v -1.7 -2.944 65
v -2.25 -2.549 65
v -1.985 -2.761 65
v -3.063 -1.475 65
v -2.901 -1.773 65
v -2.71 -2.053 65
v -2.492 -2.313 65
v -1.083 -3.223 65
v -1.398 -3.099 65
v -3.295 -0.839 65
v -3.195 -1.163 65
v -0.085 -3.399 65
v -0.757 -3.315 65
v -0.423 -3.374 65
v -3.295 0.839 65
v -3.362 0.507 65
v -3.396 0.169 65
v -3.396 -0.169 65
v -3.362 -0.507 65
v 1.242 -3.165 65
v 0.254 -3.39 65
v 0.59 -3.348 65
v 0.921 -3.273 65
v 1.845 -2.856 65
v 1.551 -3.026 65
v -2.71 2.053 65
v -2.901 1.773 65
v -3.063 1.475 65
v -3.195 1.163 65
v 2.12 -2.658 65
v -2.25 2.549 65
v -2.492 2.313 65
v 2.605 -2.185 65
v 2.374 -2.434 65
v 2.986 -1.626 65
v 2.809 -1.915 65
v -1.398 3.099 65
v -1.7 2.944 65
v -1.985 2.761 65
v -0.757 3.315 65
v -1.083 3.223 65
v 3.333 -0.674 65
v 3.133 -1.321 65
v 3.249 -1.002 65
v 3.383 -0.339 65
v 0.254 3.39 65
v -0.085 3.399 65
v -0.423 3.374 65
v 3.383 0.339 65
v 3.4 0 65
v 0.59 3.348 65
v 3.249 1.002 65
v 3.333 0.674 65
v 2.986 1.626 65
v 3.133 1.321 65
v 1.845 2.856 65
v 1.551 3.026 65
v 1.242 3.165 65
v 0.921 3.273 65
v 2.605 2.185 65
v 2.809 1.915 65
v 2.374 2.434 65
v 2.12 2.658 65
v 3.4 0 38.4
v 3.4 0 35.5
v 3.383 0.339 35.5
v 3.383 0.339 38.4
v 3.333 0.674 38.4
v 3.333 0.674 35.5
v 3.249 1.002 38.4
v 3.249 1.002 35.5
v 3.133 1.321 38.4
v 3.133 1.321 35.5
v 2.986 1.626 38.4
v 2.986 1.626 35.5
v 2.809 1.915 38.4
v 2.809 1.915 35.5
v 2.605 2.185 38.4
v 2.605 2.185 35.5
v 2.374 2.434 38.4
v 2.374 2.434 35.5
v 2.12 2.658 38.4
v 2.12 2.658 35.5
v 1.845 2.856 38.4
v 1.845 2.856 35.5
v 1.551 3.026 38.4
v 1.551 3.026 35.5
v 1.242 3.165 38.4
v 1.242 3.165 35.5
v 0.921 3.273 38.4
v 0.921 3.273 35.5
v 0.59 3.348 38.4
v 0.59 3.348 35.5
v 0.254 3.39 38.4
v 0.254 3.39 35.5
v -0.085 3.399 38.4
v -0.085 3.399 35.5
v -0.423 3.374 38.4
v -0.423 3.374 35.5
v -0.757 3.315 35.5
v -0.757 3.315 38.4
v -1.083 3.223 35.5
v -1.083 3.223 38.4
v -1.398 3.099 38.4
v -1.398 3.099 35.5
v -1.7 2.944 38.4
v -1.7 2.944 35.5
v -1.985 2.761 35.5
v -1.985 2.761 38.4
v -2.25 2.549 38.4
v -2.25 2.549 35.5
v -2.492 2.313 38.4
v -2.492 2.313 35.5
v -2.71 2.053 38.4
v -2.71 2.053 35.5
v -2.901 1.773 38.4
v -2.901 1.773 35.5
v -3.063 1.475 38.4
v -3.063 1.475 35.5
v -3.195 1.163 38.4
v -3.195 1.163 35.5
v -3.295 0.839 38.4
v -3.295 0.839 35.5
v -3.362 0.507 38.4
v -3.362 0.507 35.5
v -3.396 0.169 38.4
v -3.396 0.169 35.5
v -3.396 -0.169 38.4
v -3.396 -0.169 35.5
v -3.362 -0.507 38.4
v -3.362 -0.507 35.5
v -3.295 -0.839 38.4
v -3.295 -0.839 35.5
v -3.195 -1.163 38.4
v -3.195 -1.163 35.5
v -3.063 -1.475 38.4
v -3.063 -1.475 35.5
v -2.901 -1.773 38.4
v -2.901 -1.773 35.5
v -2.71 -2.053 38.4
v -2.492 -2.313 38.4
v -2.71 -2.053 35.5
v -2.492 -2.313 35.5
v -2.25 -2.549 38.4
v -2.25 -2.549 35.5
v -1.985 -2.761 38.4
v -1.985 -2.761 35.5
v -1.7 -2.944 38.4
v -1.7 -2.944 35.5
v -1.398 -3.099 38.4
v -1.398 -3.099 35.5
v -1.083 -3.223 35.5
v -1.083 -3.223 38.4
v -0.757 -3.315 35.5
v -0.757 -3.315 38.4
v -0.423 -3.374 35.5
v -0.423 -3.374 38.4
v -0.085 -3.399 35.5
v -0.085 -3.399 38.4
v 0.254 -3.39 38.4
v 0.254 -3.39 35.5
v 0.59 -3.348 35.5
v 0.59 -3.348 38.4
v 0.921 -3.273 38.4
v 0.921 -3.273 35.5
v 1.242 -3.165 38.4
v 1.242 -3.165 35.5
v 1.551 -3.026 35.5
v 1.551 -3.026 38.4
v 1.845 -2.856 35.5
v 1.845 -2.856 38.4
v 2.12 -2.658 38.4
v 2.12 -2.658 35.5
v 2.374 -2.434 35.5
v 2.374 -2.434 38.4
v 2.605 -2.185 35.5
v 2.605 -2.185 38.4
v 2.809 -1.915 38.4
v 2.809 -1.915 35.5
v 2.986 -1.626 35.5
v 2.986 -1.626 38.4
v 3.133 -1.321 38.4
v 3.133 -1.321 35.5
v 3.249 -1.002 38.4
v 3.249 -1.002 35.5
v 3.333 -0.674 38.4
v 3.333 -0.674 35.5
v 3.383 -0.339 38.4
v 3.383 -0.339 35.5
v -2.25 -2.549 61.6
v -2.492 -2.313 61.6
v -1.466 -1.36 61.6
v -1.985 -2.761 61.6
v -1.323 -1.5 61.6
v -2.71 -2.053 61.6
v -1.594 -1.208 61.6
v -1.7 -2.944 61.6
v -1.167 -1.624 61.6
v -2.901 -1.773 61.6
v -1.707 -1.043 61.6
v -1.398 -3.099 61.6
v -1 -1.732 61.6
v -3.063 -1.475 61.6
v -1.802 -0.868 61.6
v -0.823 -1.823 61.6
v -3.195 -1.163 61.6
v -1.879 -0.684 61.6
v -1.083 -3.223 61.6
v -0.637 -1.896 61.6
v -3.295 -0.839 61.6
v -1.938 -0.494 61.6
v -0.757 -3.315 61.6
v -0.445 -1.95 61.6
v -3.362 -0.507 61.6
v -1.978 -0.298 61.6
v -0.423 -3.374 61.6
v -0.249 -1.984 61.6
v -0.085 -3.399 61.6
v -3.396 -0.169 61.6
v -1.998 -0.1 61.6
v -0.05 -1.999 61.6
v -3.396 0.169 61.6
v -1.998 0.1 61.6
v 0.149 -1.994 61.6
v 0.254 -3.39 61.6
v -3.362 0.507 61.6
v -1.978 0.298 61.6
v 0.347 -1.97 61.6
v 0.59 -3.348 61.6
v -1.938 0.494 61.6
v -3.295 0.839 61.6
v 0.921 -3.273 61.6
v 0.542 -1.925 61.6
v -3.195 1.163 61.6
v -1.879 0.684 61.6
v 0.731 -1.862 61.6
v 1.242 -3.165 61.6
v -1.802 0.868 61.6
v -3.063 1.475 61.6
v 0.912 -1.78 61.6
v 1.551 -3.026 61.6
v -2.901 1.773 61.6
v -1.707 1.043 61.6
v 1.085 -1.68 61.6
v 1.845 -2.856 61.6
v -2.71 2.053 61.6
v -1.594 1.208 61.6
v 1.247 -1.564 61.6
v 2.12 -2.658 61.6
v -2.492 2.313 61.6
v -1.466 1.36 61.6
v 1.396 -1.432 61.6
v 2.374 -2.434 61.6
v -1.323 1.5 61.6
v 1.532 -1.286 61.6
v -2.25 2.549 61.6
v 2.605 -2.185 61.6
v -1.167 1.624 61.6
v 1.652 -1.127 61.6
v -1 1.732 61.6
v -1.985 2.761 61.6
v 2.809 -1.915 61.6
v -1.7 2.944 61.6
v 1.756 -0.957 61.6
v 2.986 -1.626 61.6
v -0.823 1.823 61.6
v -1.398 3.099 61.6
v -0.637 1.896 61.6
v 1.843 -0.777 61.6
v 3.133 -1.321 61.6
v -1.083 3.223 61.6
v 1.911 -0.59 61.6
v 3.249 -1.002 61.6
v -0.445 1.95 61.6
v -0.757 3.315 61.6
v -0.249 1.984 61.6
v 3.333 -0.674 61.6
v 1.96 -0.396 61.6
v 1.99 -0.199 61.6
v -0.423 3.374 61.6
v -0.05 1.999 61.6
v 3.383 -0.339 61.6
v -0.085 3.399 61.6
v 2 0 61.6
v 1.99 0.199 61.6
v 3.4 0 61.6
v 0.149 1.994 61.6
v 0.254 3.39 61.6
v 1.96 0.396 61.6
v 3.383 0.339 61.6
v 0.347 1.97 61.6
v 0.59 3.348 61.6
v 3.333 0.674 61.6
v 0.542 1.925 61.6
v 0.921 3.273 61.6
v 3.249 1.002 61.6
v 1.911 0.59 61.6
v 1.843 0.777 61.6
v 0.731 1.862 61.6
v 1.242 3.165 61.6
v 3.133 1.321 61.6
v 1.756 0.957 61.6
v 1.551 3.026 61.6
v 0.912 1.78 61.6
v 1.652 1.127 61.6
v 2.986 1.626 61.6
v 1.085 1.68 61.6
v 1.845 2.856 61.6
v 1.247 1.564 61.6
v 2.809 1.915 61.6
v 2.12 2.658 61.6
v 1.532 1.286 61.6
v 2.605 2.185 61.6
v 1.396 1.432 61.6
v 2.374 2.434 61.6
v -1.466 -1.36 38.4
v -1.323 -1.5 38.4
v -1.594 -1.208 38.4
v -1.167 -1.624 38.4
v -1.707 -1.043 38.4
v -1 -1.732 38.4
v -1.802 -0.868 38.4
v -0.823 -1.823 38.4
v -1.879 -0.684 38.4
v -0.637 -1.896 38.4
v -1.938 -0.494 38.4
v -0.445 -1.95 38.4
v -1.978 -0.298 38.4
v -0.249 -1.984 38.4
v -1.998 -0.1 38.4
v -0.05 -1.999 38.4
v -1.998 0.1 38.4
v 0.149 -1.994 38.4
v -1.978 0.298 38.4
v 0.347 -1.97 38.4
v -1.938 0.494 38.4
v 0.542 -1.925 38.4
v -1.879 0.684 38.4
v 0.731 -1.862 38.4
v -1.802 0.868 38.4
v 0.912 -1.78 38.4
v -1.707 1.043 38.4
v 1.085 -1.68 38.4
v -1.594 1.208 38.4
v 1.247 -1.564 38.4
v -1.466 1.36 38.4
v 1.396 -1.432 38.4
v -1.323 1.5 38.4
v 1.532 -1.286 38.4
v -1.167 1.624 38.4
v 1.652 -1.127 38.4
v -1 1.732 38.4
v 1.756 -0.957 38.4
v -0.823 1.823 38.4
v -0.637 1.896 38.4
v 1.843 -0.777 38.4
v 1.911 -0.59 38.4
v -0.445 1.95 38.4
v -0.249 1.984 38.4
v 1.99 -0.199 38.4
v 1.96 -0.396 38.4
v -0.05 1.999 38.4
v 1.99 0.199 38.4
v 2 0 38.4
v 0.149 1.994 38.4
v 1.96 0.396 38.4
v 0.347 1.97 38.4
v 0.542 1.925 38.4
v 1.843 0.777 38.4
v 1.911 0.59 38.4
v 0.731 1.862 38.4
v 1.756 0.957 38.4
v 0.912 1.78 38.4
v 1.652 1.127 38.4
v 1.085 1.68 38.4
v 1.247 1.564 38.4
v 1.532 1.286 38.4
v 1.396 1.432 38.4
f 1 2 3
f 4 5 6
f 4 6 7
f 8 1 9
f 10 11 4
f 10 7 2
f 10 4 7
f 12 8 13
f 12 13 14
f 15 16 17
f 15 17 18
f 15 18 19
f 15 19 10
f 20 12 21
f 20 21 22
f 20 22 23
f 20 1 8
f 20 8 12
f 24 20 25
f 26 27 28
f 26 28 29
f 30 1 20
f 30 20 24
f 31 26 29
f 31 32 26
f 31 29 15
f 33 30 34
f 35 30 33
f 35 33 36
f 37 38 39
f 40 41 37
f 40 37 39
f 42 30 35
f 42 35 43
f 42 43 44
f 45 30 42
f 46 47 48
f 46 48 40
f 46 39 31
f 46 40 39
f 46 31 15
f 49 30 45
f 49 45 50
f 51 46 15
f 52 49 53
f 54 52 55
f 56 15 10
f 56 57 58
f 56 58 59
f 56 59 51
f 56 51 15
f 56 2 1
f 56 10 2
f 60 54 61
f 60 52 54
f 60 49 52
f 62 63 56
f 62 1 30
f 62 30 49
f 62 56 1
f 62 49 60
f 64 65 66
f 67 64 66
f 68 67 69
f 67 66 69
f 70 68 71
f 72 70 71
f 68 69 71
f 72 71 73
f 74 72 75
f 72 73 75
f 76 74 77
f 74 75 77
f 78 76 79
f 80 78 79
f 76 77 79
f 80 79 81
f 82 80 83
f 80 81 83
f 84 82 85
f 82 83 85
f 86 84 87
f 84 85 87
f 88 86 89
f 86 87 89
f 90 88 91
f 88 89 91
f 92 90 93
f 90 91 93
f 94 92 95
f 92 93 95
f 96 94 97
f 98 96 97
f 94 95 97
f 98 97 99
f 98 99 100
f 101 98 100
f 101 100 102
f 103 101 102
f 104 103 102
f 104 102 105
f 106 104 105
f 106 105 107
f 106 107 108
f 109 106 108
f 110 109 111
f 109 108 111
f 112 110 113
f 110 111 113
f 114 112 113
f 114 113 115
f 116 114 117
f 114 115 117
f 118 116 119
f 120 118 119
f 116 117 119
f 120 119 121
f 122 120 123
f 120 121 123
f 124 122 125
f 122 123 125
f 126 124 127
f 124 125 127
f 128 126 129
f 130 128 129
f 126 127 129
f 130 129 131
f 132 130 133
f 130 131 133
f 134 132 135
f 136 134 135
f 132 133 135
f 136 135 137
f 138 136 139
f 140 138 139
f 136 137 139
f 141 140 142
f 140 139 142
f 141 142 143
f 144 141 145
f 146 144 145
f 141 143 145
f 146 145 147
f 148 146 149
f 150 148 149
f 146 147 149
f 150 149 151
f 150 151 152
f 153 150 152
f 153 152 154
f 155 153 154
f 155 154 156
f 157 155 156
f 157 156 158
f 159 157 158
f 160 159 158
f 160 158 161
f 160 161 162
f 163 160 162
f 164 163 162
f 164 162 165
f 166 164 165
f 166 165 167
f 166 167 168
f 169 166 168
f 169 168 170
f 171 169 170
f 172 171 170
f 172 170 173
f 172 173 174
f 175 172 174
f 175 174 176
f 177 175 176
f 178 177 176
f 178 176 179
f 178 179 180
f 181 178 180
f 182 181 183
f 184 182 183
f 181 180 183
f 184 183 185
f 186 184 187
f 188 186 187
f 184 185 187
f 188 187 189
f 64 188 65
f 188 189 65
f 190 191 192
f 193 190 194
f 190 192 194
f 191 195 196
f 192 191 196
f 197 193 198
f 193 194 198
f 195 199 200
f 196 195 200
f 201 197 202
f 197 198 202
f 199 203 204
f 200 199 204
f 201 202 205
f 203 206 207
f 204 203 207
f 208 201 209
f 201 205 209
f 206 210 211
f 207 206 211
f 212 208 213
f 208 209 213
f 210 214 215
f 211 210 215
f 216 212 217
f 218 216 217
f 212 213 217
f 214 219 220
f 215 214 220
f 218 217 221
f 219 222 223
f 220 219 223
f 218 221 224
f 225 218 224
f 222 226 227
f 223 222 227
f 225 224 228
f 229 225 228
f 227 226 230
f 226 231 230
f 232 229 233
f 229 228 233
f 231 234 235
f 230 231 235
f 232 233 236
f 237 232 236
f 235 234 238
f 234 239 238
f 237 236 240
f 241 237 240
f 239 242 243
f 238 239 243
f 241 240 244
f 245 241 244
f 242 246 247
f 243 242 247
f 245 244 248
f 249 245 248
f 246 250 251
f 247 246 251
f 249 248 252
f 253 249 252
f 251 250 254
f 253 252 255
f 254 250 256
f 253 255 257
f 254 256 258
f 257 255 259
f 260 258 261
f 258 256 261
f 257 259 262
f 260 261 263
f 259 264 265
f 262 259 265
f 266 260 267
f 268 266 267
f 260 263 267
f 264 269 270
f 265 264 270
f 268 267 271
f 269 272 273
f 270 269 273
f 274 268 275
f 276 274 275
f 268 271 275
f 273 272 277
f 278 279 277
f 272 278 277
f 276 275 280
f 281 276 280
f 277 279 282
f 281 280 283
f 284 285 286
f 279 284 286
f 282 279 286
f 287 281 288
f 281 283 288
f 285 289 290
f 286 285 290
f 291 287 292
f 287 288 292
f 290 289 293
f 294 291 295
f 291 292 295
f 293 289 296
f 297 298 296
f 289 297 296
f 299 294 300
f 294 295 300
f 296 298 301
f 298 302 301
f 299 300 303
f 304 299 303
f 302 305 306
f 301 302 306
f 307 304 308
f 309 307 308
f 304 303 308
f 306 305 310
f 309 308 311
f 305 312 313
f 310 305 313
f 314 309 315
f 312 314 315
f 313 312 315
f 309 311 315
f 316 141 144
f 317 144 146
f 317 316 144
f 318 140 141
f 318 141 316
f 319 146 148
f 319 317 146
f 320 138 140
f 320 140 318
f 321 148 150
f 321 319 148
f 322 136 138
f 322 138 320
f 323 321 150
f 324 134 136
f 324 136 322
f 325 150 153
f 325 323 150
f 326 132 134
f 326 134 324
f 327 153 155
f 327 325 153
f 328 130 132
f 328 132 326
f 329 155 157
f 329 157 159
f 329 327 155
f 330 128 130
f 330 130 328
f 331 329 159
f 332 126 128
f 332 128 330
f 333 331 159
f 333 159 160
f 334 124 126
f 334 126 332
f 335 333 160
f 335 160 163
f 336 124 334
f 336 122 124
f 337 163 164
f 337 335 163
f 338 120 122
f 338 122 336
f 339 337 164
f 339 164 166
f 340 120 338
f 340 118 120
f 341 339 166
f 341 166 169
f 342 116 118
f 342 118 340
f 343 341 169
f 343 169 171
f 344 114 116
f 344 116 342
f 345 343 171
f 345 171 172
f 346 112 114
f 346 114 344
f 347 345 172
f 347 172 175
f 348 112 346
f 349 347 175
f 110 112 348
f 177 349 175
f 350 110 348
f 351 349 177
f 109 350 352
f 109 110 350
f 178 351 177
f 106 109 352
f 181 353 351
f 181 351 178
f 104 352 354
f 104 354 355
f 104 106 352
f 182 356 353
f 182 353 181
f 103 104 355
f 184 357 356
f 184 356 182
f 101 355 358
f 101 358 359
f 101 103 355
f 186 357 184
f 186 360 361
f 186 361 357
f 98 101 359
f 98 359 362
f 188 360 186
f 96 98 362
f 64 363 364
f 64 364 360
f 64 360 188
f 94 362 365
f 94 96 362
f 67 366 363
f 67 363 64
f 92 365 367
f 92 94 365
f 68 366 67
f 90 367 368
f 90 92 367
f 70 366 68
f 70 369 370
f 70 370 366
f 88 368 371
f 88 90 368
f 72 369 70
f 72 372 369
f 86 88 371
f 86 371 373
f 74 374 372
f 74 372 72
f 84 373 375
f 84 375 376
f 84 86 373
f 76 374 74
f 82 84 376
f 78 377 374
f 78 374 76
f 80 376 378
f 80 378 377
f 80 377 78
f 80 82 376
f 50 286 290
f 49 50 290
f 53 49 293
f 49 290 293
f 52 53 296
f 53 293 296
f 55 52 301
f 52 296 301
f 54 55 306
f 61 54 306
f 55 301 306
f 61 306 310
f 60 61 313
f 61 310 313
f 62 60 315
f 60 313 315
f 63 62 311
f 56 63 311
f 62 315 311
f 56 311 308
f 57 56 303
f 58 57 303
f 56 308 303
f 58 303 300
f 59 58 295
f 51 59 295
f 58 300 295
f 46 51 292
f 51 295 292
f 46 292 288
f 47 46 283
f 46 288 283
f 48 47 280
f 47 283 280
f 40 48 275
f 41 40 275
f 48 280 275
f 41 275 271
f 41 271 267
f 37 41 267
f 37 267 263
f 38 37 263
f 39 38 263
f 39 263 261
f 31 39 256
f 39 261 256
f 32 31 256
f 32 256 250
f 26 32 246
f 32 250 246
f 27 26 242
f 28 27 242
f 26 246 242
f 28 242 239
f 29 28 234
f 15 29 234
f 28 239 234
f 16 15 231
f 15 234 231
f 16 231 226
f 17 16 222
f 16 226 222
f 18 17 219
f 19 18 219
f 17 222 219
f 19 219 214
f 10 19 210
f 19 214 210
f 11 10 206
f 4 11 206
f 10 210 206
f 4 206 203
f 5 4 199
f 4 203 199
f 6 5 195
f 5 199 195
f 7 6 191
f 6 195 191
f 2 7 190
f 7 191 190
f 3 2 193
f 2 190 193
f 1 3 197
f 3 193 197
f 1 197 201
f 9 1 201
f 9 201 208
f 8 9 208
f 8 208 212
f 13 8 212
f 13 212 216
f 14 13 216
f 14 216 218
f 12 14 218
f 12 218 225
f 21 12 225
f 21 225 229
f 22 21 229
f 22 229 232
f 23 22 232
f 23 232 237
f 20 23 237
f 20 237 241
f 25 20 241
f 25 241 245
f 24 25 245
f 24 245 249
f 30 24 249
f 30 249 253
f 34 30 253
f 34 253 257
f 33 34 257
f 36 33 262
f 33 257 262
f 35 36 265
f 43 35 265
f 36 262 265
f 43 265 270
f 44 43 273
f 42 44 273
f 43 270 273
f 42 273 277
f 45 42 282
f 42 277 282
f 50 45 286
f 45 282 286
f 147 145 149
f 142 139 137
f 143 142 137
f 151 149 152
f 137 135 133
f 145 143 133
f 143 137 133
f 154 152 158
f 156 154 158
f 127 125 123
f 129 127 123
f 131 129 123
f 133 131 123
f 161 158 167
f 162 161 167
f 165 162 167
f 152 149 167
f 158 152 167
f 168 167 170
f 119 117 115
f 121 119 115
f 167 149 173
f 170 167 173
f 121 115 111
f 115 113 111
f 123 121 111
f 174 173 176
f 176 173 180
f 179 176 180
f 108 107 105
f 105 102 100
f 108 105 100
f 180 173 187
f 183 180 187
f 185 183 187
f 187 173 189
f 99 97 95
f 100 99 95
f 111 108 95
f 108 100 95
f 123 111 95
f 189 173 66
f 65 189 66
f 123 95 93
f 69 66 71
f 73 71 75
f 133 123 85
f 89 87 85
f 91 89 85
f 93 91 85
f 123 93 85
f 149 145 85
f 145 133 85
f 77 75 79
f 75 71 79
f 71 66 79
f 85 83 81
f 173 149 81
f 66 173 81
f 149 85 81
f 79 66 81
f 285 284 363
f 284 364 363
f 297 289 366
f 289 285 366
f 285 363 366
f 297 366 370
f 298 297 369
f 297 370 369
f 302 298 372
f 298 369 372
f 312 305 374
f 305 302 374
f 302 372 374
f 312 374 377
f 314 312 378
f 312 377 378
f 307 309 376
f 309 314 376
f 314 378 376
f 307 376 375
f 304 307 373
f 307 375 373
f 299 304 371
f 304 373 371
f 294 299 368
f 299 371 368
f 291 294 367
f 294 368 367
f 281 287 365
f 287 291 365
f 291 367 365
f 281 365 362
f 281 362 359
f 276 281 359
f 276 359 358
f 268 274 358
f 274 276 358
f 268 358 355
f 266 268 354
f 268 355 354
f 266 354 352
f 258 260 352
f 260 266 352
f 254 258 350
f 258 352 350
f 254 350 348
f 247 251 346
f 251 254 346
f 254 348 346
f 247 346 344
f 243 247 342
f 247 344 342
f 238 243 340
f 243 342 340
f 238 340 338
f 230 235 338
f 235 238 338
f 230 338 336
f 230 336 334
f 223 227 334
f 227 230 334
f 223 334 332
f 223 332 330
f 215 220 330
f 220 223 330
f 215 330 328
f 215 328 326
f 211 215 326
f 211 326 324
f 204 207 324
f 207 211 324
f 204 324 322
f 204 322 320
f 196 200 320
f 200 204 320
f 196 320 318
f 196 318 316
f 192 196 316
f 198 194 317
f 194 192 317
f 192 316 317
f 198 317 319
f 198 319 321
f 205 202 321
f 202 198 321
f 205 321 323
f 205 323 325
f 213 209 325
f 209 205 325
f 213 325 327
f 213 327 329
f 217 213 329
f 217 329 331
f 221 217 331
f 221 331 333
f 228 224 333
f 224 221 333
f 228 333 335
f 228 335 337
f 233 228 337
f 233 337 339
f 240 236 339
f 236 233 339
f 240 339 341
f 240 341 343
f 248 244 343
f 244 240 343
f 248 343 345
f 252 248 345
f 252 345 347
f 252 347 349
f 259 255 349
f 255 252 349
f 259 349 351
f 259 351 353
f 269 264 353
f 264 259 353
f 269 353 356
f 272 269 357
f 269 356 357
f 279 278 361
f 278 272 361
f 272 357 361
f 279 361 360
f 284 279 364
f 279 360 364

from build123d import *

# Parameters (mm, degrees)
M4_START                = 35.5
SKETCH1_R               = 2
M4_SHANK_AND_GRIP_DEPTH = 29.5
HEAD_START              = 61.6
SKETCH2_R               = 3.4
HEAD_DEPTH              = 3.4
LOCKNUT_START           = 35.5
SKETCH3_R               = 3.4
LOCKNUT_DEPTH           = 2.9


with BuildPart() as part:
    # Sketch1 → M4 shank and grip (new body)
    with BuildSketch(Plane.XY.offset(M4_START)):
        Circle(SKETCH1_R)
    extrude(amount=M4_SHANK_AND_GRIP_DEPTH)

    # Sketch2 → Head (add)
    with BuildSketch(Plane.XY.offset(HEAD_START)):
        Circle(SKETCH2_R)
    extrude(amount=HEAD_DEPTH)

    # Sketch3 → Locknut (add)
    with BuildSketch(Plane.XY.offset(LOCKNUT_START)):
        Circle(SKETCH3_R)
    extrude(amount=LOCKNUT_DEPTH)


solid = part.part
